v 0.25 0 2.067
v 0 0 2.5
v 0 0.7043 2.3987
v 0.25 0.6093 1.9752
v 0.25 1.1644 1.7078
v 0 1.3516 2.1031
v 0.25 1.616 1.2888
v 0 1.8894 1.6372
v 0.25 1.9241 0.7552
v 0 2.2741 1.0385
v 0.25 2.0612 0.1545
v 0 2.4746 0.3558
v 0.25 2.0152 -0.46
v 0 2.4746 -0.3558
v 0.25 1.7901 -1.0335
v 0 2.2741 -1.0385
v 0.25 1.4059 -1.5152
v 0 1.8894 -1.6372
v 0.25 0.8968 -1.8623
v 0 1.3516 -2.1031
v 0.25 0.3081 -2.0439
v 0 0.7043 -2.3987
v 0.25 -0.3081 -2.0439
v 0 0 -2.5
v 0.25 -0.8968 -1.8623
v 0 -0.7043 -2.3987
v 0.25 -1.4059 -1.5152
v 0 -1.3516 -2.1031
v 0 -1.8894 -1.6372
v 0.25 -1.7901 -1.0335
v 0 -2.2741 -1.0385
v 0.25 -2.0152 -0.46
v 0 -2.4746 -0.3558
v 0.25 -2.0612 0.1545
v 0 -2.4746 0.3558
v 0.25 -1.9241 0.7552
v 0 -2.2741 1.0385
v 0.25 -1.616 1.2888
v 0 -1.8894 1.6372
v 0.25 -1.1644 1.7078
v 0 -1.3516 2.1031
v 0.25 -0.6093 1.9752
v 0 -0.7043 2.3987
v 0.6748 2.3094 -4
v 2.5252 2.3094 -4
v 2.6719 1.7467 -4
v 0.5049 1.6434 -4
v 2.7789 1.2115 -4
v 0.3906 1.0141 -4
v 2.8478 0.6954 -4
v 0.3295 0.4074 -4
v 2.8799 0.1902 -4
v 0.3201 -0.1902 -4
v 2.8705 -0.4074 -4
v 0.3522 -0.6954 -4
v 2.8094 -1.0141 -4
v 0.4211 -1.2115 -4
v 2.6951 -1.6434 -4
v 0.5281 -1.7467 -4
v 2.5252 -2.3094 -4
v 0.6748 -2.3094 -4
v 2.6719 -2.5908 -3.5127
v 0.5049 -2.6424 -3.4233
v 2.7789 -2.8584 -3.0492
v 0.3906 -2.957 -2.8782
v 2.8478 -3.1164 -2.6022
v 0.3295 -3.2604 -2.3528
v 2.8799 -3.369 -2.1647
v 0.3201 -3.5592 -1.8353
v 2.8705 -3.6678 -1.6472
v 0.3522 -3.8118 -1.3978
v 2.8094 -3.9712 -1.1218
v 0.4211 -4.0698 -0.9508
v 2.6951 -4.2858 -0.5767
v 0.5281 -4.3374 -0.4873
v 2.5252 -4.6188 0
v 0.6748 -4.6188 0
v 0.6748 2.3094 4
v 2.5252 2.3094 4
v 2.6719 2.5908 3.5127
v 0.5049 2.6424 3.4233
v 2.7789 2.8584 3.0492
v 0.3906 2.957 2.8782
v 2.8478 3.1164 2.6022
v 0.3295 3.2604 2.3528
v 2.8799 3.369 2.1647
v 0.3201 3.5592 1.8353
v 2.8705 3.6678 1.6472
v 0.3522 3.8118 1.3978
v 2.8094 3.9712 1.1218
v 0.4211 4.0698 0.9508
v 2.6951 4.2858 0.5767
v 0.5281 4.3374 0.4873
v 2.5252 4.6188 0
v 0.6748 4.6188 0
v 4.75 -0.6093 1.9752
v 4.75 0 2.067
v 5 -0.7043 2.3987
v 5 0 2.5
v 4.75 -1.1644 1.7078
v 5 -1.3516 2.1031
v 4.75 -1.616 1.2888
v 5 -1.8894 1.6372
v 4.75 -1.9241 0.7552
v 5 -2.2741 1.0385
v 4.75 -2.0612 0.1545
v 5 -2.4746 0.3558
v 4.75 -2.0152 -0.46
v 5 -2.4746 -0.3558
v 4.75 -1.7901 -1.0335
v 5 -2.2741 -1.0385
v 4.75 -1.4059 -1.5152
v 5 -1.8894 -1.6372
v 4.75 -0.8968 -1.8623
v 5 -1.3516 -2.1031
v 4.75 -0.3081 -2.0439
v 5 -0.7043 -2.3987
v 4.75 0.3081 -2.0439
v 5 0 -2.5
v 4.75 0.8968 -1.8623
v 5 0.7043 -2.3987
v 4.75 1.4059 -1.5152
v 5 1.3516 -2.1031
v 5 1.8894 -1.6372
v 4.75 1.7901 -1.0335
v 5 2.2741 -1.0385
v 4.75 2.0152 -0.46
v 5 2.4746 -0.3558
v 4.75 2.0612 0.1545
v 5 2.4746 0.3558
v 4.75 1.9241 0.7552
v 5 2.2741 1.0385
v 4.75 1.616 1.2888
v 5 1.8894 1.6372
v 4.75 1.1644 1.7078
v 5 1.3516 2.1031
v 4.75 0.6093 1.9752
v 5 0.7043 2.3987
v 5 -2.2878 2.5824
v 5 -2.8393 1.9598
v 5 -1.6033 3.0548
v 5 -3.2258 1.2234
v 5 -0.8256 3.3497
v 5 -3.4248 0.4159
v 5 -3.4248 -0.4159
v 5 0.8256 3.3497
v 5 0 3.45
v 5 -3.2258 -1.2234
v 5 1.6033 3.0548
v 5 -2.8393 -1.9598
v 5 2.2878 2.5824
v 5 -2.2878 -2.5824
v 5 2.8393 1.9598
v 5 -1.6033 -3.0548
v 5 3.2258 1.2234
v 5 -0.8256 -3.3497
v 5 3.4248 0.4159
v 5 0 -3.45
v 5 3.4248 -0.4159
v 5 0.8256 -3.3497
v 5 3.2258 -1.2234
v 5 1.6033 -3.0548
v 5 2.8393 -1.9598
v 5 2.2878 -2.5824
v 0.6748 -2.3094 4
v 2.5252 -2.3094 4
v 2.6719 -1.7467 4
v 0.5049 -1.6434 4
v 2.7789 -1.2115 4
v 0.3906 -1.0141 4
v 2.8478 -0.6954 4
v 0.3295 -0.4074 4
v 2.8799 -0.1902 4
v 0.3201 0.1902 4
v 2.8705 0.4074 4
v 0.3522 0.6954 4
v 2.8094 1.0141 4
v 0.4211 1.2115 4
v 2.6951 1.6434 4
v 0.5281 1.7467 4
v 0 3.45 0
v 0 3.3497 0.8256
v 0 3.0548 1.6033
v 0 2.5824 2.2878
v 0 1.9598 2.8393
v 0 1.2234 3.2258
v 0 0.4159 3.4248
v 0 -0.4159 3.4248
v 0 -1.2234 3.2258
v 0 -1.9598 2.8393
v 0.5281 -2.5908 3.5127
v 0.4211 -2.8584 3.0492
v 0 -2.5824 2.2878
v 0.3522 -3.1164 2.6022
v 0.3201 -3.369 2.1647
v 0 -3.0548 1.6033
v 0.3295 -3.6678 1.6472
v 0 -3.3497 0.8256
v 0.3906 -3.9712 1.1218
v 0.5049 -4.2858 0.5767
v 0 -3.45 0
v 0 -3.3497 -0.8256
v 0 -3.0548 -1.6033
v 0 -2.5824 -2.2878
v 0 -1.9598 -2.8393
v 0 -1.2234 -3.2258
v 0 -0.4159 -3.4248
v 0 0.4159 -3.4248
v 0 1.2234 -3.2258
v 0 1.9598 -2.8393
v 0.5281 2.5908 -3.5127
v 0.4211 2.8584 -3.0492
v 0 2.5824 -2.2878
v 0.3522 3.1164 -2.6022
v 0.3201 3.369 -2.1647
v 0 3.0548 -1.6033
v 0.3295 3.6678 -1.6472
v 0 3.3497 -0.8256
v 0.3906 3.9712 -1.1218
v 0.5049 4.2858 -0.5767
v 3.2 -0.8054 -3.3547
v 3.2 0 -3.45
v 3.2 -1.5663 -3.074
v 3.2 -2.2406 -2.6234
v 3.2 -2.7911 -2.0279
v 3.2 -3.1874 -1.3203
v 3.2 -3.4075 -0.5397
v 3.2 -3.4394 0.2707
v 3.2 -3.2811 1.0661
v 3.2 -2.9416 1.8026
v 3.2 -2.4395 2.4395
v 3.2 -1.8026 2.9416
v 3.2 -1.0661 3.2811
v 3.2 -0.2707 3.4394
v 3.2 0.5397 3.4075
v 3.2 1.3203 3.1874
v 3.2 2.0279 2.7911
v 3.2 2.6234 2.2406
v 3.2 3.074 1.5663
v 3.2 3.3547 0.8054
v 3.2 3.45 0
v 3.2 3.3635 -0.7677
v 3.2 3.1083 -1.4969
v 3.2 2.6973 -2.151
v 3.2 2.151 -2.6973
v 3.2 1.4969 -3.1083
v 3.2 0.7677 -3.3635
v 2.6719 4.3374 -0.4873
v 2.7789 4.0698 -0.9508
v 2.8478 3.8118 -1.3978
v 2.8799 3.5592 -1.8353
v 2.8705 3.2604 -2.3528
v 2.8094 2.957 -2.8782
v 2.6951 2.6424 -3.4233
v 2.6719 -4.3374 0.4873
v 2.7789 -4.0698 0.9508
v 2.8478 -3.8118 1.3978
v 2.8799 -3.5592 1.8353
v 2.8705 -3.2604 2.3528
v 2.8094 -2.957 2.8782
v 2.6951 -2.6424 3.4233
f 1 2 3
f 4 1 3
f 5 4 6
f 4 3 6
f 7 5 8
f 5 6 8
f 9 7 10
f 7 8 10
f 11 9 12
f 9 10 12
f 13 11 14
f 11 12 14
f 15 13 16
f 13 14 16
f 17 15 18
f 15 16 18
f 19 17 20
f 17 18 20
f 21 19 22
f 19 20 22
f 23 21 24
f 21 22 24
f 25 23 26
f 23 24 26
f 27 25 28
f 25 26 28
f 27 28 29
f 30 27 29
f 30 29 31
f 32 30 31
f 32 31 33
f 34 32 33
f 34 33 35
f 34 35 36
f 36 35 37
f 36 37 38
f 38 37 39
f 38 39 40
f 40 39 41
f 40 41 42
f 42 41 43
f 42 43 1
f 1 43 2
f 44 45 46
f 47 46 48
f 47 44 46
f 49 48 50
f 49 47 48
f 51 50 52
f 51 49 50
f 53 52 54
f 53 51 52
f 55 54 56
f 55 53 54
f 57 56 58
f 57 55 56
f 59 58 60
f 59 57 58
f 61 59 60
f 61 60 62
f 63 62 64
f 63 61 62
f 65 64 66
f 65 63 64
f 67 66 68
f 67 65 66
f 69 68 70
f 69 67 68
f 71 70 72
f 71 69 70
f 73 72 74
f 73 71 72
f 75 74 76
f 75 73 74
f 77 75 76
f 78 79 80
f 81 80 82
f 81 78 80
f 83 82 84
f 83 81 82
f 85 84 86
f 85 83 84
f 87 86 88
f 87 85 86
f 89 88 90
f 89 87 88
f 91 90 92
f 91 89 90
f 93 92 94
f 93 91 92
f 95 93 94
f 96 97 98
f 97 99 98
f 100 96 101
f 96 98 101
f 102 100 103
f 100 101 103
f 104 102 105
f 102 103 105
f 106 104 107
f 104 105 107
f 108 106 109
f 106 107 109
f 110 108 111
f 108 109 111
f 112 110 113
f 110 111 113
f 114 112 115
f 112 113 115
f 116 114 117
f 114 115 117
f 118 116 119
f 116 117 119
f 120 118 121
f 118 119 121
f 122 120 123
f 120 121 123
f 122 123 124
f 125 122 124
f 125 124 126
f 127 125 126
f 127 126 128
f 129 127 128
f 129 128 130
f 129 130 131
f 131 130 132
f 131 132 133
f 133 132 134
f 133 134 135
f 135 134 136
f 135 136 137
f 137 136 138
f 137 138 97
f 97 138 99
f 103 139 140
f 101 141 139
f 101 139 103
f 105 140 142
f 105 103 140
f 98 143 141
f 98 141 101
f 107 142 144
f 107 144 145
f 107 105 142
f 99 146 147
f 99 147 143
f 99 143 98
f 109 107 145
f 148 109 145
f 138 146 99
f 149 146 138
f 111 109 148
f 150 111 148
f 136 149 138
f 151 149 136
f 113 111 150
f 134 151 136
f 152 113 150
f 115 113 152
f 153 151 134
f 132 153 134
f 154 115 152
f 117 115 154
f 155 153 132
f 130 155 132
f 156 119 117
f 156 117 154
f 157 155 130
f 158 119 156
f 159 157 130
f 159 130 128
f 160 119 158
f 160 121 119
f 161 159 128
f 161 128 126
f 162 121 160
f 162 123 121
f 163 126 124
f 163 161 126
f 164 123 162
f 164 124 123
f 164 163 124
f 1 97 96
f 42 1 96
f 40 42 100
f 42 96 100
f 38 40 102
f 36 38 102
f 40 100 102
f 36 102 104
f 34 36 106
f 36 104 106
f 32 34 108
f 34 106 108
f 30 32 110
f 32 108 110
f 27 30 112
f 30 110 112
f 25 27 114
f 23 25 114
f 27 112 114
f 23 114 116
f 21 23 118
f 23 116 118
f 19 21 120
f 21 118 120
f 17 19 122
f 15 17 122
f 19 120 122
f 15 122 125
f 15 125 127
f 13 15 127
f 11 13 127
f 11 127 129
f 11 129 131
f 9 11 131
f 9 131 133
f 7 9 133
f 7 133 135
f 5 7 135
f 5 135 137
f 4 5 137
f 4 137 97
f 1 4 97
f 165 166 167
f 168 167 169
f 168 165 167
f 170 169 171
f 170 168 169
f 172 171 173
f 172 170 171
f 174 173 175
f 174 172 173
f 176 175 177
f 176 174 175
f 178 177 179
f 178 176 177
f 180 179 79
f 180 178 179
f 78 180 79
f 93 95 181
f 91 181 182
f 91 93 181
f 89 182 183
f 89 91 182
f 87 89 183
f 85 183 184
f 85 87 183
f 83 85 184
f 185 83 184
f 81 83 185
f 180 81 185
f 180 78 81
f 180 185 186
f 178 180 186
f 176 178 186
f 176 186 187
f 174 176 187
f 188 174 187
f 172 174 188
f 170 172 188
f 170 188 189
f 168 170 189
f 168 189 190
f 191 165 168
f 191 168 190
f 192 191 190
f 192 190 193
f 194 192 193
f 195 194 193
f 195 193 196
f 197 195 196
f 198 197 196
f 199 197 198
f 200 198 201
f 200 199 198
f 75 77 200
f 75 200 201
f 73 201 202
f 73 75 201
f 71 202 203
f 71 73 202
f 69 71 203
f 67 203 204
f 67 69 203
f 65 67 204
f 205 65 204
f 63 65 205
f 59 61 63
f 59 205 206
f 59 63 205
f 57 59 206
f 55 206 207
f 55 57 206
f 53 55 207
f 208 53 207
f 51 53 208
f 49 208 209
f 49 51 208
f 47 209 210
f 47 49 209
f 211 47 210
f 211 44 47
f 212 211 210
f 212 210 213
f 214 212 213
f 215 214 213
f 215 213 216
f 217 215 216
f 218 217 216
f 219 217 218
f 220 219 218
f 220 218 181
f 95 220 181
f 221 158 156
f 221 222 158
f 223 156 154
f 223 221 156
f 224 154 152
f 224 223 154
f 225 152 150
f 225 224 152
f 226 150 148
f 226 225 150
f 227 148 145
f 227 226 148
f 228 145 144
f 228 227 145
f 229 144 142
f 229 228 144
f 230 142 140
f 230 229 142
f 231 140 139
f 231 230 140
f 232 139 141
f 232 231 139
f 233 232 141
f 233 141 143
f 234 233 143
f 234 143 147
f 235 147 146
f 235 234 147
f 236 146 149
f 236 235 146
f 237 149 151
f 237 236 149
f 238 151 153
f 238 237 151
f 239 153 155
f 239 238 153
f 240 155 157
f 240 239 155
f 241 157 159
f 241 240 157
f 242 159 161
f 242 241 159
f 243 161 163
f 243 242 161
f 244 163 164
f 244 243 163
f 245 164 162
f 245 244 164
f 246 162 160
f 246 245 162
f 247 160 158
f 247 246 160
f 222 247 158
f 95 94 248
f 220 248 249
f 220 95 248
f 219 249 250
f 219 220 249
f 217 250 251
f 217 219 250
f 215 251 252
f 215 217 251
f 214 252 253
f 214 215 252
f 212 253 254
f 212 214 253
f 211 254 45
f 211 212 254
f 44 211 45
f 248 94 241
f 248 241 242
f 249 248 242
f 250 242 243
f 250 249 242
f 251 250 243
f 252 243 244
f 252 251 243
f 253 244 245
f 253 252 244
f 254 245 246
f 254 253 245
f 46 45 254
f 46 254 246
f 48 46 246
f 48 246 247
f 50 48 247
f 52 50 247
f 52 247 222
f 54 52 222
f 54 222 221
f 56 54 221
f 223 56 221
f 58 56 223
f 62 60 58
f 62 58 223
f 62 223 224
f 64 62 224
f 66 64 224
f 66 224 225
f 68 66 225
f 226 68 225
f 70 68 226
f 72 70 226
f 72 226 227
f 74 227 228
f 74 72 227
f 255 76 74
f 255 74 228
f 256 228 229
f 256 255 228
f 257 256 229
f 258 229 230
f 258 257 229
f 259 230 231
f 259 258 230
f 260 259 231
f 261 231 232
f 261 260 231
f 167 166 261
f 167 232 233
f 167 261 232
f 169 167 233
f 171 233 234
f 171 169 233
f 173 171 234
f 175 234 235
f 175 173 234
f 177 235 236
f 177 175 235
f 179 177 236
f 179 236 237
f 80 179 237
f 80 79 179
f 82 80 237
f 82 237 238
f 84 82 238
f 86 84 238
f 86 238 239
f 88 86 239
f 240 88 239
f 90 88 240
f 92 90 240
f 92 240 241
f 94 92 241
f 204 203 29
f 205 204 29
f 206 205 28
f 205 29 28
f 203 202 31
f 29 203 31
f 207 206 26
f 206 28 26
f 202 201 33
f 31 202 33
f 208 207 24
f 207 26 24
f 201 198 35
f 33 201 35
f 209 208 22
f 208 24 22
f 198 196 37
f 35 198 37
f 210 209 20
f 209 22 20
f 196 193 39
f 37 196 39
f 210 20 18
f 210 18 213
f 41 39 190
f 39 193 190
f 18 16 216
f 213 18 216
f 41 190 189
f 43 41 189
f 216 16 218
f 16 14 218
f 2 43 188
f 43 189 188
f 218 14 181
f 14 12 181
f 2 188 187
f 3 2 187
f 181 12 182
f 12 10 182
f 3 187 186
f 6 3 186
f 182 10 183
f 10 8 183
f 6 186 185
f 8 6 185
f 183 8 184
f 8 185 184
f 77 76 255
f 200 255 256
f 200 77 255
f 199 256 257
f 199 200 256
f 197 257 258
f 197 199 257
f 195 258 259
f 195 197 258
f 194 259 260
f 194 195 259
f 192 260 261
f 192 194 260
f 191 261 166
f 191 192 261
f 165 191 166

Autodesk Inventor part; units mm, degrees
ref_plane "YZ Plane" through (0, 0, 0) normal (1, 0, 0) x (0, 1, 0)
ref_plane "XZ Plane" through (0, 0, 0) normal (0, 1, 0) x (-1, 0, 0)
sketch "Sketch1" plane through (0, 0, 0) normal (1, 0, 0) x (0, 1, 0)
  line L0 (2.3094, -4) -> (-2.3094, -4)
  line L1 (-2.3094, -4) -> (-4.6188, 0)
  line L2 (-4.6188, 0) -> (-2.3094, 4)
  line L3 (-2.3094, 4) -> (2.3094, 4)
  line L4 (2.3094, 4) -> (4.6188, 0)
  line L5 (4.6188, 0) -> (2.3094, -4)
  point P0 (0, 0)
  point P1 (0, 0)
  dimension "d0" = 9.2376
extrude "Body" add sketch "Sketch1" along normal blind 3.2
sketch "Sketch2" plane through (3.2, 0, 0) normal (1, 0, 0) x (0, 0, -1)
  circle A0 centre (0, 0) radius 3.45
  dimension "d7" = 6.9
extrude "Ring" add sketch "Sketch2" along normal blind 1.8
sketch "Sketch3" plane through (0, 0, 0) normal (0, 0, 1) x (1, 0, 0)
  line L0 (0, 2.3094) -> (0, 4.6188) projected
  line L1 (0, 4.6188) -> (3.2, 4.6188) projected
  line L2 (3.2, 2.3094) -> (3.2, 4.6188) projected
  line L3 (-0.64, 0) -> (3.84, 0) projected
  line L4 (0, 3.45) -> (0.6748, 4.6188)
  line L5 (2.5252, 4.6188) -> (3.2, 3.45)
  dimension "d3" = 30
  dimension "d4" = 30
  dimension "d5" = 6.9
  dimension "d6" = 6.9
revolve "Chamfer1" cut sketch "Sketch3" angle 360 about axis through (-10, 0, 0) along (1, 0, 0)
sketch "Sketch4" plane through (0, 0, 0) normal (-1, 0, 0) x (0, 0, 1)
  line L0 (0, -6.4663) -> (0, 6.4663) projected
  line L1 (-5.6, 0) -> (5.6, 0) projected
  point P0 (0, 0)
hole "Thread" at (0, 0, 0) direction (1, 0, 0) diameter 4.134 end through all thread size "M5x0.8" class "6H" standard "ISO Metric profile"
chamfer "Chamfer2" distance 0.433 angle 30 1 edges at (0, 0, -2.067) measured on face at (0, 2.9506, -0.3583)
chamfer "Chamfer3" distance 0.433 angle 30 1 edges at (5, 0, -2.067) measured on face at (5, -0.4401, -2.9356)
ref_plane "Work Plane1" through (13.2035, 0, 0) normal (0, 0, 1) x (-1, 0, 0)
equation "\"d0\" = 1.1547 * SW"
equation "\"d1\" = KOH1"
equation "\"d7\" = SD2"
equation "\"d8\" = KOH - KOH1"
equation "\"d3\" = ANG1"
equation "\"d4\" = ANG2"
equation "\"d5\" = SW0"
equation "\"d6\" = SW01"
equation "\"d10\" = -0.5 * GD1 + 0.5 * NND"
equation "\"d46\" = -0.5 * GD1 + 0.5 * NND"
equation "\"d12\" = -0.5 * GD1 + 0.5 * NND"
equation "\"d47\" = -0.5 * GD1 + 0.5 * NND"
equation "\"ANG1\" = 30deg"
equation "\"ANG2\" = 30deg"
equation "\"NND\" = 5"
equation "\"KOH1\" = 3.2"
equation "\"KOH\" = 5"
equation "\"SW\" = 8"
equation "\"SW0\" = 6.9"
equation "\"SW01\" = SW0"
equation "\"SD2\" = SW0"
equation "\"GUL\" = 0.541266 * PTC"
equation "\"THREADDIA\" = 5"
equation "\"TOA\" = 30deg"
equation "\"PTC\" = 0.8"
equation "\"GAL\" = 0.541266 * PTC"
equation "\"E0\" = 1.155 * SW"
equation "\"GD1\" = 4.133975"
properties part number "DIN 985 - M5" material "Steel, Mild"
